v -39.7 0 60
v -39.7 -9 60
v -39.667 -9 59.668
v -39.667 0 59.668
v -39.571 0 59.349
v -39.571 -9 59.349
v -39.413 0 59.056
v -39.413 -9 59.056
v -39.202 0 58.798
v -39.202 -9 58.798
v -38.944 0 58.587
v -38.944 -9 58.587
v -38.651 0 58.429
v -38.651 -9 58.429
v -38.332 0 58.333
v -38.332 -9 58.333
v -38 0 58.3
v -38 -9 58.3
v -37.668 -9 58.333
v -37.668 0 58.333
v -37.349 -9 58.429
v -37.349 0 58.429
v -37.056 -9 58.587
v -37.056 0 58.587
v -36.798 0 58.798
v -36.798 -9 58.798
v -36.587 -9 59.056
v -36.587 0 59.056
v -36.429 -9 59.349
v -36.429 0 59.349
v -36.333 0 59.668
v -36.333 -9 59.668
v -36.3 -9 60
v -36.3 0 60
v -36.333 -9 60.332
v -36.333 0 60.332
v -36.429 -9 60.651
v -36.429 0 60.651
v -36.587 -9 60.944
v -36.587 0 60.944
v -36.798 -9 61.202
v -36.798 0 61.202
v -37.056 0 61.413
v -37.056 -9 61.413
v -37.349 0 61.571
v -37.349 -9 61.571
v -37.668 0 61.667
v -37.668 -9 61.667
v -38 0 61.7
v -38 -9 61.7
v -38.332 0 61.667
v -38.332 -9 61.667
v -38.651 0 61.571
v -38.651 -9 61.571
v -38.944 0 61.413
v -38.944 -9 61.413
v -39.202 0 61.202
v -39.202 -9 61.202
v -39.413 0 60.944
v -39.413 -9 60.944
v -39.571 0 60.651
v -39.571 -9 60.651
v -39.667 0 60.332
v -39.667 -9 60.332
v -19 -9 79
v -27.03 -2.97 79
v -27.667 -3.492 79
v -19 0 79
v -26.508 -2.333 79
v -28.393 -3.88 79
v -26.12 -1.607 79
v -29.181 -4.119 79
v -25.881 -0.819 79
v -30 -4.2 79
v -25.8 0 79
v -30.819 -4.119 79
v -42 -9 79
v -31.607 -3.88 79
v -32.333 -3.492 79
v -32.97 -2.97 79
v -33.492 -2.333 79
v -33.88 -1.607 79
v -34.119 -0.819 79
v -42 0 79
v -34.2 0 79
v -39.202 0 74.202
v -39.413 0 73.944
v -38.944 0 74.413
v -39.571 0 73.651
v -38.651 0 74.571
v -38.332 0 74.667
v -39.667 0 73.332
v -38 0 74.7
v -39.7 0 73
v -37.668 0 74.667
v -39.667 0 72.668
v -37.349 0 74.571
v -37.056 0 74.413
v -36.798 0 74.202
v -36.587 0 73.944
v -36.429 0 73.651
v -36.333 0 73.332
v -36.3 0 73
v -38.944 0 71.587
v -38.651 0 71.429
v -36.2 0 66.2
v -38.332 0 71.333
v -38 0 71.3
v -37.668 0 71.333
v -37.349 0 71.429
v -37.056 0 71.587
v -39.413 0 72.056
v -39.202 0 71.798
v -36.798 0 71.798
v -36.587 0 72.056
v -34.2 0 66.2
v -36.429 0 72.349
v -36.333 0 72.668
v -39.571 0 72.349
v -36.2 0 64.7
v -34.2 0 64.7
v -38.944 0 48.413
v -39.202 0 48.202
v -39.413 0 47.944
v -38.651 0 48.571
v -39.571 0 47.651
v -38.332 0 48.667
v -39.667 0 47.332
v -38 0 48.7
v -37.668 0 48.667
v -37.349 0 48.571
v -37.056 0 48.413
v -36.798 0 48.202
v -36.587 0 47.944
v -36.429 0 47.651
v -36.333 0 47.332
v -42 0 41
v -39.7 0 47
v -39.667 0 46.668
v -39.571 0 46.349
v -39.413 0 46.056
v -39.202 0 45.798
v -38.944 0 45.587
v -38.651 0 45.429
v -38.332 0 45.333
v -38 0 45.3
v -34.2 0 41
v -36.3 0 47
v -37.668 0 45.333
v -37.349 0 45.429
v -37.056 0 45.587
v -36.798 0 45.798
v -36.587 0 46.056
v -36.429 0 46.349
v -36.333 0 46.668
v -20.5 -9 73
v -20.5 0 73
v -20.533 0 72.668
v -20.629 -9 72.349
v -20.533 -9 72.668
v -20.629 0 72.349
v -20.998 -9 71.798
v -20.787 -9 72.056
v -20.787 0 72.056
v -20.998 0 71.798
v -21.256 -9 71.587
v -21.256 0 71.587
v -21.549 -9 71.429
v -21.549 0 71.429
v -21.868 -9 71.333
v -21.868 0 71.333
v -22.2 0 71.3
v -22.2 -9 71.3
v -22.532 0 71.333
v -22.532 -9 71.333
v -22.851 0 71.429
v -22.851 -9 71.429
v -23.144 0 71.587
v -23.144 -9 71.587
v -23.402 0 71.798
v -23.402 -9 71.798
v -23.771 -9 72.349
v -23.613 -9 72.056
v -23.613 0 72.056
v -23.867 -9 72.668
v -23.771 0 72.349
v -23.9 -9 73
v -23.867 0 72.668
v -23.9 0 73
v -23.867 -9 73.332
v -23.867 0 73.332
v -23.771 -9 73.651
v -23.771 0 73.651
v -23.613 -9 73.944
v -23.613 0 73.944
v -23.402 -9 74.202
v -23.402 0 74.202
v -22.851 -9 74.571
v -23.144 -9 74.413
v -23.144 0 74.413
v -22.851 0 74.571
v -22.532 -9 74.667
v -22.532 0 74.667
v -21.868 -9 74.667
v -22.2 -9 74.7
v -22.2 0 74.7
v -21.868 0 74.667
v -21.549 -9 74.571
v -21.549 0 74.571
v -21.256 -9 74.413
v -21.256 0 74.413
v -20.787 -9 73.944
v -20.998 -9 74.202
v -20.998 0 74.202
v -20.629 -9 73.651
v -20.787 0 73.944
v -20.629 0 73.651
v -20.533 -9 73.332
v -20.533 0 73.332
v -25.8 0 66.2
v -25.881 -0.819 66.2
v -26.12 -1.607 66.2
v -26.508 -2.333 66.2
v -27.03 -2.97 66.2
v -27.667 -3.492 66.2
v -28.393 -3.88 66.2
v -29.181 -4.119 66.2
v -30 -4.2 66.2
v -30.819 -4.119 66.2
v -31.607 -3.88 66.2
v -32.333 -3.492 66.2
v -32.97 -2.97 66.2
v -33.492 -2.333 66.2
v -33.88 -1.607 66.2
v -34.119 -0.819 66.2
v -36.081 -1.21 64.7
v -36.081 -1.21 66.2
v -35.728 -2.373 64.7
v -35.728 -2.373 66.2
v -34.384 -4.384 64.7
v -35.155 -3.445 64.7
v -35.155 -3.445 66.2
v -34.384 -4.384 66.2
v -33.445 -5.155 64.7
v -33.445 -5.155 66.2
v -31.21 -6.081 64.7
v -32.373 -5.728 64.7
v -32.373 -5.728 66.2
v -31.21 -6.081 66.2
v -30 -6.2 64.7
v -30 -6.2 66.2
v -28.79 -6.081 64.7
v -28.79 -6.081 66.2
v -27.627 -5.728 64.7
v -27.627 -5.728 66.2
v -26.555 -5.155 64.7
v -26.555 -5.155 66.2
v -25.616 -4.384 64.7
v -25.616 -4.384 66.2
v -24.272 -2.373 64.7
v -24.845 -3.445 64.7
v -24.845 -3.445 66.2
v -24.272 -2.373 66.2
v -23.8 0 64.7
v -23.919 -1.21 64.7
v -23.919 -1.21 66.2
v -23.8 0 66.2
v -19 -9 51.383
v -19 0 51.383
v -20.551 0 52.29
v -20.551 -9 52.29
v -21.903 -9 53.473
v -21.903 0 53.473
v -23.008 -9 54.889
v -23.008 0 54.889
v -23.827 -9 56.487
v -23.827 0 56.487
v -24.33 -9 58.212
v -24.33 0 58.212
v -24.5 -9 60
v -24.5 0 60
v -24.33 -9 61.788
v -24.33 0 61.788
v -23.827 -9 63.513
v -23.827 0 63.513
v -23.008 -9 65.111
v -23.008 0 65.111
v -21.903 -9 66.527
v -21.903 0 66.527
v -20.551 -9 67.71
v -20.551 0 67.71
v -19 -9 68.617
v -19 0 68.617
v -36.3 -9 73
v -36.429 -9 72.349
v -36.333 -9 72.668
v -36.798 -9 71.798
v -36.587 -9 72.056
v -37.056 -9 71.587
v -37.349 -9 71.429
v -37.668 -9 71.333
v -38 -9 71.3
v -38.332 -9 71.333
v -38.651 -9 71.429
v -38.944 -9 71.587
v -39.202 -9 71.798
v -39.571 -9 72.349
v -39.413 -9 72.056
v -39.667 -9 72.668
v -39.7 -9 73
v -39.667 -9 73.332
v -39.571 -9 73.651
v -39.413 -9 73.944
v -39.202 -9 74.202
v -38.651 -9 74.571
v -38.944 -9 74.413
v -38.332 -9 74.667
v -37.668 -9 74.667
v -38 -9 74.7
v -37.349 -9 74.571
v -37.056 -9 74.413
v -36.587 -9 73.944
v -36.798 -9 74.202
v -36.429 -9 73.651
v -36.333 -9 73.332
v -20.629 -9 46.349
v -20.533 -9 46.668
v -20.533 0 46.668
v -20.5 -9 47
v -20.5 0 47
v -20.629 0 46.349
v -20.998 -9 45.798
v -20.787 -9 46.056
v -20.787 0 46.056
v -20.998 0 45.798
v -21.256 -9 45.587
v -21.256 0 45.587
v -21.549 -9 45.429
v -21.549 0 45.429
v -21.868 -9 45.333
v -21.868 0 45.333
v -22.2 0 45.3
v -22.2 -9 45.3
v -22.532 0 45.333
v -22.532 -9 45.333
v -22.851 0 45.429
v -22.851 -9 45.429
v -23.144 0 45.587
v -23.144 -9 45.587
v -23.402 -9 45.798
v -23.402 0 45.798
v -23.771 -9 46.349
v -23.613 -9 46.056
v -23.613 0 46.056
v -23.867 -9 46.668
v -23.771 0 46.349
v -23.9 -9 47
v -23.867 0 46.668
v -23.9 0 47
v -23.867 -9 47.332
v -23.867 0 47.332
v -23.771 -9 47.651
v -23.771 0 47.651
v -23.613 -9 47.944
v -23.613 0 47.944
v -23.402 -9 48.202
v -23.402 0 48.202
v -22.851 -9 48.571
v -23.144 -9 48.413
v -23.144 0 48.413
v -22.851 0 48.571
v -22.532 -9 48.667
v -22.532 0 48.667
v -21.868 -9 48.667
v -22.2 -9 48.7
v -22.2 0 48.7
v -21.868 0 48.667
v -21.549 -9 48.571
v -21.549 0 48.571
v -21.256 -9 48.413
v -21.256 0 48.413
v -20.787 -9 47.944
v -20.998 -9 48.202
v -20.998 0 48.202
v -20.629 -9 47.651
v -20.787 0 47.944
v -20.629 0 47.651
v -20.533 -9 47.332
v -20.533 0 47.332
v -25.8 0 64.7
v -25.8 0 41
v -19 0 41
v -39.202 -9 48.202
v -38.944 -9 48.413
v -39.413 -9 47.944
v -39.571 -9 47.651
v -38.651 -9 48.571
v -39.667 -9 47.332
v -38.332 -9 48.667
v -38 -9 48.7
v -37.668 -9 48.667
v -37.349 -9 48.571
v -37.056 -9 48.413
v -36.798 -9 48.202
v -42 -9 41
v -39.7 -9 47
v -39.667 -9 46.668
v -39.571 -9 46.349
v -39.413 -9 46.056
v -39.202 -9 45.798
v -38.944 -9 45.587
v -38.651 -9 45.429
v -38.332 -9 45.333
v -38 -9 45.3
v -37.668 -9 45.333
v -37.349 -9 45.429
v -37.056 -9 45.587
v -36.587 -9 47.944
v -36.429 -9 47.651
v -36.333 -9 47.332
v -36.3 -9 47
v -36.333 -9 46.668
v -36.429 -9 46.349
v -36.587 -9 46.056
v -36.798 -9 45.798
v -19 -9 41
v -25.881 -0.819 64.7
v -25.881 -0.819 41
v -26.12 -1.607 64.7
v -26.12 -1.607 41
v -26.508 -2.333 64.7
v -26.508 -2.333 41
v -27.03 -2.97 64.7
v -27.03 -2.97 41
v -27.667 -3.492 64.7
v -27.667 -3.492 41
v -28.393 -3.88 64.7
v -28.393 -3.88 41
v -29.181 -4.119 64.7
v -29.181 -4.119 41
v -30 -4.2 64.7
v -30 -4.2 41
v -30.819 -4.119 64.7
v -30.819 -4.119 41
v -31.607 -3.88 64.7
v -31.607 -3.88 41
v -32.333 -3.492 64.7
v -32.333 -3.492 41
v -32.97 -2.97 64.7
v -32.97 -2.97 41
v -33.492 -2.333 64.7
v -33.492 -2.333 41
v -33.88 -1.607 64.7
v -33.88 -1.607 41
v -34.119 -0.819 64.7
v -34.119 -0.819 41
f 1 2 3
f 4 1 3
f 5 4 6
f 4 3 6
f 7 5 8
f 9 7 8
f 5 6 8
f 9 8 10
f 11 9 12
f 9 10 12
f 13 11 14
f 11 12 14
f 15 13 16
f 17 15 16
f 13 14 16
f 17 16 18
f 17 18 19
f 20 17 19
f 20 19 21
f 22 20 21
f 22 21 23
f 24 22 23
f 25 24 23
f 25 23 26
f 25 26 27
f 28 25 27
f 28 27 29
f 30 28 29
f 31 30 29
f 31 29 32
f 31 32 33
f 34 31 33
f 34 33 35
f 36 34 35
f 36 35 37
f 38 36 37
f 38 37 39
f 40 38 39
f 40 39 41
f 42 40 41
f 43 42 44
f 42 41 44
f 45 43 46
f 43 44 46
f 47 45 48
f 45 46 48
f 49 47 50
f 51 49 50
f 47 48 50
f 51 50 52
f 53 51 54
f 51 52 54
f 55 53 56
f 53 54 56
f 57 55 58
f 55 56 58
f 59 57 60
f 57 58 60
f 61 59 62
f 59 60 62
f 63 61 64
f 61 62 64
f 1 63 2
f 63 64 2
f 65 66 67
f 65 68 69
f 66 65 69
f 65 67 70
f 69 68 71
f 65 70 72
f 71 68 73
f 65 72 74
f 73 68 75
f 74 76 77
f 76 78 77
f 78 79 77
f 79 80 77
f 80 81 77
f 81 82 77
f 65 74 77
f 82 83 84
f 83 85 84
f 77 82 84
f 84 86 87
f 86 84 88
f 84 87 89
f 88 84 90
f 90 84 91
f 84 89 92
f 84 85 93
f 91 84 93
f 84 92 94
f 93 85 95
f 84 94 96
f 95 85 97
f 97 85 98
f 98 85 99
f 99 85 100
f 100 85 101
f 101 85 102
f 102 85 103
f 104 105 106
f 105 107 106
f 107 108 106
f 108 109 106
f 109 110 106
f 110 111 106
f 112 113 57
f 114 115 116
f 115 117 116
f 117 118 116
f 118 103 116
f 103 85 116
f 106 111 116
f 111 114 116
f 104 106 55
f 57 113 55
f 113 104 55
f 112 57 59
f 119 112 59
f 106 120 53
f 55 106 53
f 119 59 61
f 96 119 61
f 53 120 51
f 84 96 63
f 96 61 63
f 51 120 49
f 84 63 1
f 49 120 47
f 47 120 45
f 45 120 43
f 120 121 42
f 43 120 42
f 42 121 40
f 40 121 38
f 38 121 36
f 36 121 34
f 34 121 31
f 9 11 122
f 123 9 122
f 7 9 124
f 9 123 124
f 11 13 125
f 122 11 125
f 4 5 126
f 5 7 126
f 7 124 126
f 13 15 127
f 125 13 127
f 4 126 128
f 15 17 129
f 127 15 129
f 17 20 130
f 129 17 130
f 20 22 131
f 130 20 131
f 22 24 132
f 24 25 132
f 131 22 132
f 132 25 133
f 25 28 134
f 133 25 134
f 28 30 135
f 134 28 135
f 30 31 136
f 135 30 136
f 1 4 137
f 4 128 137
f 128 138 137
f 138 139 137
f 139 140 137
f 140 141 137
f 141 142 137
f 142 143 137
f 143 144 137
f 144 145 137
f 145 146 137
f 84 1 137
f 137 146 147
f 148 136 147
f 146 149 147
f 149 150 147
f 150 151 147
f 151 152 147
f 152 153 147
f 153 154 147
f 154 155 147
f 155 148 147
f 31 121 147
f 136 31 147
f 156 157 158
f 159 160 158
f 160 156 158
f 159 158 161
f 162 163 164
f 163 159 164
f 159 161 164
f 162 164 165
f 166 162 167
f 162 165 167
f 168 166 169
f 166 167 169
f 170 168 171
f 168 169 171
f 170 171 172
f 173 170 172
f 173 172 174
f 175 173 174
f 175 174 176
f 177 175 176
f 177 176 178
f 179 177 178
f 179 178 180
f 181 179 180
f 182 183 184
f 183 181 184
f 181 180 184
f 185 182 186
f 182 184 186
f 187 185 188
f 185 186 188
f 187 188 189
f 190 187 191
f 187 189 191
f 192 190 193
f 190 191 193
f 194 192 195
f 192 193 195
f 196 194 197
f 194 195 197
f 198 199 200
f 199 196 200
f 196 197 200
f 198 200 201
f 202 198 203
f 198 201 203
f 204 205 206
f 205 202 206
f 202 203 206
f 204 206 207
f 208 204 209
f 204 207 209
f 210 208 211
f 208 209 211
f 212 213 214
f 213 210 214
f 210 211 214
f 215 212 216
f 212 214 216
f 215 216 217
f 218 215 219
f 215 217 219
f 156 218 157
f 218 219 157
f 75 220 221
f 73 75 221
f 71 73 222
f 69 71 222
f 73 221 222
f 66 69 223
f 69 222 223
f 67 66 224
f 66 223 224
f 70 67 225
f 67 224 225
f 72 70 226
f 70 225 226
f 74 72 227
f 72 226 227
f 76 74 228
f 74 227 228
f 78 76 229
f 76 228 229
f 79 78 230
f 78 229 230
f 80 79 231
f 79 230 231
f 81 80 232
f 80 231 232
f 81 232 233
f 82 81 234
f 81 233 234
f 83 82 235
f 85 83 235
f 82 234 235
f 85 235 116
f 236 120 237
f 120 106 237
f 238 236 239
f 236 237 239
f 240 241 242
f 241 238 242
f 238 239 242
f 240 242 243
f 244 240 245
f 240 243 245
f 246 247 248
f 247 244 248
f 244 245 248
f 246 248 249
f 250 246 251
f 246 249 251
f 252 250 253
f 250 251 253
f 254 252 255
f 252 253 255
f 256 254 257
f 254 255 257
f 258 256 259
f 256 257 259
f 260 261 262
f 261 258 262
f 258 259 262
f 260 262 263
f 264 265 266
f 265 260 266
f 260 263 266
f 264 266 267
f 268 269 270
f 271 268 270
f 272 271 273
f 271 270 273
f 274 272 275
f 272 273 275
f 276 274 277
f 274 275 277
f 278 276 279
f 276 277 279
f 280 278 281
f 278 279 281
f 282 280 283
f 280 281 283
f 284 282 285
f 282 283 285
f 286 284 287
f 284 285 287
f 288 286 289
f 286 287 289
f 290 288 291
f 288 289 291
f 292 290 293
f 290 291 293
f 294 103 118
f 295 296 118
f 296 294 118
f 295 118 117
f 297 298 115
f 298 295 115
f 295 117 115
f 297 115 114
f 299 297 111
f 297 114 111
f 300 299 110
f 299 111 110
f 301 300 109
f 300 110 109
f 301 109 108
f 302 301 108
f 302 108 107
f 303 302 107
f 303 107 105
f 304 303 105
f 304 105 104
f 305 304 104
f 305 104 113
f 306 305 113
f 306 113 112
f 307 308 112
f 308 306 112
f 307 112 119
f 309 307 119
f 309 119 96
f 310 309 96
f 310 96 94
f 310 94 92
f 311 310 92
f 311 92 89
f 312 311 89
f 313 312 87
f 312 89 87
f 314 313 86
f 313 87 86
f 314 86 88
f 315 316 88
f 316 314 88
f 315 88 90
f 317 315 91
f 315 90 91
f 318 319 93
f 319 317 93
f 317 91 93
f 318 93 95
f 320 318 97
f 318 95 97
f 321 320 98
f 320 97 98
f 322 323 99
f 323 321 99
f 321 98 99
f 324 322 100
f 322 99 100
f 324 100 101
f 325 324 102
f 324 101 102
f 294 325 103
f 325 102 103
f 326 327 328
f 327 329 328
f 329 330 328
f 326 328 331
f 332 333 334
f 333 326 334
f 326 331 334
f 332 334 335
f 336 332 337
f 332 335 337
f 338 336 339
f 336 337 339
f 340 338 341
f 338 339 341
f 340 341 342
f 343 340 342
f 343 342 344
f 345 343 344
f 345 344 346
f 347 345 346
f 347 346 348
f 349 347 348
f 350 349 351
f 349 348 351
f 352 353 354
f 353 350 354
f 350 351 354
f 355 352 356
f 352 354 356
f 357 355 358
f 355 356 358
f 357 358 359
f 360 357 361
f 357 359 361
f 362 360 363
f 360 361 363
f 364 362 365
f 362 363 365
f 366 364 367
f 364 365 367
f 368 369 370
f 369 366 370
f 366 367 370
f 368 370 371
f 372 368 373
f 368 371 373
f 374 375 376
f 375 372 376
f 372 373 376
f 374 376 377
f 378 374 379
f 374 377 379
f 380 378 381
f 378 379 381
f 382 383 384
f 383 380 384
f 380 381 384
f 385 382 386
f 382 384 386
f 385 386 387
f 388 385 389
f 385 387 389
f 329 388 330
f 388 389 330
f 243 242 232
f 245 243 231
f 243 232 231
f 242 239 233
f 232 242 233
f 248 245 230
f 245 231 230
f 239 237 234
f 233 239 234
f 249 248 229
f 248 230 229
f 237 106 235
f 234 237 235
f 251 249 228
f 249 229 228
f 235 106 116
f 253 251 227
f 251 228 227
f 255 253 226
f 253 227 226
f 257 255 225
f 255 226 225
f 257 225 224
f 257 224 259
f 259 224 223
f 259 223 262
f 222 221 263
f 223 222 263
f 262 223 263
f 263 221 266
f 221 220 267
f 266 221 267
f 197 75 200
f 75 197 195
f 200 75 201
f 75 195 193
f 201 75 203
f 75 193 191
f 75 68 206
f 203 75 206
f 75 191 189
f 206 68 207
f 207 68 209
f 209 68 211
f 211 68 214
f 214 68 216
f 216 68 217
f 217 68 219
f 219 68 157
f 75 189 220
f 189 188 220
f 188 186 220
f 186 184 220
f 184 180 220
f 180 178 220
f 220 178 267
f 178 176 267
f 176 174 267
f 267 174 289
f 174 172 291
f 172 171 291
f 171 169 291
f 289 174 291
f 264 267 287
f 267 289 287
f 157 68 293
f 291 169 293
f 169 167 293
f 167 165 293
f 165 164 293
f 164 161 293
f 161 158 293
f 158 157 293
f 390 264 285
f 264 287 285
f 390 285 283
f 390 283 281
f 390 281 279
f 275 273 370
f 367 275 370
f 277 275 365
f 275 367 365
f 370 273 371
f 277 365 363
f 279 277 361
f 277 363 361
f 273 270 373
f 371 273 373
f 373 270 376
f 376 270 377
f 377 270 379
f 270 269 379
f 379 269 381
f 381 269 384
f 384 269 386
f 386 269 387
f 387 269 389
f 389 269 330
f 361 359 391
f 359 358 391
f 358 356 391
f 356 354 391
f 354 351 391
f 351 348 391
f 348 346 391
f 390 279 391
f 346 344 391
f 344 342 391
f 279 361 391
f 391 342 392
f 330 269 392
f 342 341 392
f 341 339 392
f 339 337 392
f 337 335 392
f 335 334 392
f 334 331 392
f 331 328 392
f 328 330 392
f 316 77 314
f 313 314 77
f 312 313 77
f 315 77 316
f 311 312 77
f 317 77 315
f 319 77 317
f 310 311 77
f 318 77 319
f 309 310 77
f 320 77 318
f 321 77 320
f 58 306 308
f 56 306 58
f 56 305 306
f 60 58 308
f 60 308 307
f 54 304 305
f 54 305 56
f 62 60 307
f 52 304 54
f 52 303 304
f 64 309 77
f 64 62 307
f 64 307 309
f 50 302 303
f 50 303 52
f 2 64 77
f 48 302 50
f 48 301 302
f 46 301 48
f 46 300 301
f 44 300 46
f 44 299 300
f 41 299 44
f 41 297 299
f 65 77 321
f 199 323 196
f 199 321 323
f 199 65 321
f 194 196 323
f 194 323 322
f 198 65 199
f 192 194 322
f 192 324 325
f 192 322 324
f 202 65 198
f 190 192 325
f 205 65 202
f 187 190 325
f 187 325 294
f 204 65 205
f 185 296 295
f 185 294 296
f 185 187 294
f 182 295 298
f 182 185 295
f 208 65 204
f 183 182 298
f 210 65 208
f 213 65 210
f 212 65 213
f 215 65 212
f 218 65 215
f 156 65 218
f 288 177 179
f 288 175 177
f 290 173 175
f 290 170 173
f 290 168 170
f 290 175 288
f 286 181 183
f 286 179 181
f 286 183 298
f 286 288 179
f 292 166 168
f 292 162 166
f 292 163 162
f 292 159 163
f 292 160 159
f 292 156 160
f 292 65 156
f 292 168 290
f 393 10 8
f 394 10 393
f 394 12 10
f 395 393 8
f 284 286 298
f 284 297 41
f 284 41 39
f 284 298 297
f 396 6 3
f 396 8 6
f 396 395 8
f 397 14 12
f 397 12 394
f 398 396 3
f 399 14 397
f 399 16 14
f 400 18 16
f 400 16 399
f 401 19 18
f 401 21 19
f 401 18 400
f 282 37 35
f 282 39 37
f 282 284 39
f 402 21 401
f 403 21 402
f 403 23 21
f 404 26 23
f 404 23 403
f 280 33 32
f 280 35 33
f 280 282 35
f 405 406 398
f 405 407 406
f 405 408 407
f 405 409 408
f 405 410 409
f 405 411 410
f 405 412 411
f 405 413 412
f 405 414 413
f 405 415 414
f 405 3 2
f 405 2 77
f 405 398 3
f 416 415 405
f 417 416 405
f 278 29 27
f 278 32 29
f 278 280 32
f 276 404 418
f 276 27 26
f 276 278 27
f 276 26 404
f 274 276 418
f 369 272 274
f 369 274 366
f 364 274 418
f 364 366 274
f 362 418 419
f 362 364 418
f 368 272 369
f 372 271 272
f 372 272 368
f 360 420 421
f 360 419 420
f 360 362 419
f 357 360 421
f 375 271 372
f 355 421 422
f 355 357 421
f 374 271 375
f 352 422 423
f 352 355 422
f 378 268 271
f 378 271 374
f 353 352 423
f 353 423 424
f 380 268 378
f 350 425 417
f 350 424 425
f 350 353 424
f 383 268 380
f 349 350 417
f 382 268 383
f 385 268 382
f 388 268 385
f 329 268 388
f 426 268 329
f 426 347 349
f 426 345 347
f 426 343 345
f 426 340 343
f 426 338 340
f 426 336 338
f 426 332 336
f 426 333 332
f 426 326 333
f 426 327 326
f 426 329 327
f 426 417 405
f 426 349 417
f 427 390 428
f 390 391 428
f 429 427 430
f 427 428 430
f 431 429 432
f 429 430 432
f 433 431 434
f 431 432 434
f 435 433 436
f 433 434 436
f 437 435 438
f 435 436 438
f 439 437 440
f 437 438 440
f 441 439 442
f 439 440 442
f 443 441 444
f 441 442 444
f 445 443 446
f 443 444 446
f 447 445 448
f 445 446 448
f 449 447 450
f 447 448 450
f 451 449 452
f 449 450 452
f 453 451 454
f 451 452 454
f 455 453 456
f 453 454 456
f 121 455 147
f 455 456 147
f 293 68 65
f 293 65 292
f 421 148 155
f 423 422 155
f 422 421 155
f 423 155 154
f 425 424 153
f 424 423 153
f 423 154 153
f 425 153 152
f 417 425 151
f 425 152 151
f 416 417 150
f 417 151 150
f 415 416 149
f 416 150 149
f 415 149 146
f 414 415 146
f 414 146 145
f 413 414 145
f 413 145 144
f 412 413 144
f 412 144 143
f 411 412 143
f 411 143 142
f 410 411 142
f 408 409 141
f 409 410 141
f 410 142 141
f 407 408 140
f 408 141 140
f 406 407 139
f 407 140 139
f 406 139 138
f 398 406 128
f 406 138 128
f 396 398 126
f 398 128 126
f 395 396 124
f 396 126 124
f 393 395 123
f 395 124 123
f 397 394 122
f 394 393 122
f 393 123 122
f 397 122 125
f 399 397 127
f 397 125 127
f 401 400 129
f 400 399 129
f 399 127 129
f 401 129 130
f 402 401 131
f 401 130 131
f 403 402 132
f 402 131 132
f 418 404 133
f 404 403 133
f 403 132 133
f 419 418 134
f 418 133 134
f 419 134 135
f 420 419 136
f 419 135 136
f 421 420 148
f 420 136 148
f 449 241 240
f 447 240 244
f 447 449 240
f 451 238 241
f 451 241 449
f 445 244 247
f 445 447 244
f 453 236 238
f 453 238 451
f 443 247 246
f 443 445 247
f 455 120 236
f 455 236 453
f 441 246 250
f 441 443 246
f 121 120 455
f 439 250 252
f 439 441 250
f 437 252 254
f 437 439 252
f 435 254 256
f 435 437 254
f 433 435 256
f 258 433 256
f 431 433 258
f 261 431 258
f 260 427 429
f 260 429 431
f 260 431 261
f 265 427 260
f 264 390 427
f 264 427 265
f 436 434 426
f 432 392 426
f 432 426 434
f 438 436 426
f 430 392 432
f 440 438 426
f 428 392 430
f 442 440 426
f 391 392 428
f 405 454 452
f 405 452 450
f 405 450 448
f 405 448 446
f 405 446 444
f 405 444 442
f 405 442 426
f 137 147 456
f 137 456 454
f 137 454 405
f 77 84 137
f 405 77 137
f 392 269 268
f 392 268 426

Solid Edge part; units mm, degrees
sketch "Sketch1" plane through (0, 0, 0) normal (0, -1, 0) x (1, 0, 0)
  circle A0 centre (-38, 73) radius 1.7
  circle A1 centre (-22.2, 73) radius 1.7
  circle A2 centre (-22.2, 47) radius 1.7
  circle A3 centre (-38, 47) radius 1.7
  line L0 (-42, 79) -> (-42, 41)
  line L1 (-19, 41) -> (-42, 41)
  line L2 (-19, 51.3832) -> (-19, 41)
  line L3 (-19, 79) -> (-19, 68.6168)
  line L4 (-19, 79) -> (-42, 79)
  arc A4 (-19, 51.3832) -> (-19, 68.6168) centre (-15, 60) cw
extrude "Protrusion1" add sketch "Sketch1" along normal blind 9
sketch "Sketch2" plane through (-29.9, -4, 41) normal (0, 0, -1) x (0, -1, 0)
  circle A0 centre (-4, 0.1) radius 4.2
extrude "Cutout1" cut sketch "Sketch2" against normal through all
sketch "Sketch3" plane through (-29.9, -4, 66.2) normal (0, 0, 1) x (0, -1, 0)
  circle A0 centre (-4, -0.1) radius 6.2
extrude "ExtrudedCutout_2" cut sketch "Sketch3" against normal blind 1.5
sketch "Sketch4" plane through (-29.9, -9, 61.3992) normal (0, -1, 0) x (-1, 0, 0)
  circle A0 centre (8.1, 1.3992) radius 1.7
extrude "Cutout2" cut sketch "Sketch4" against normal through all
